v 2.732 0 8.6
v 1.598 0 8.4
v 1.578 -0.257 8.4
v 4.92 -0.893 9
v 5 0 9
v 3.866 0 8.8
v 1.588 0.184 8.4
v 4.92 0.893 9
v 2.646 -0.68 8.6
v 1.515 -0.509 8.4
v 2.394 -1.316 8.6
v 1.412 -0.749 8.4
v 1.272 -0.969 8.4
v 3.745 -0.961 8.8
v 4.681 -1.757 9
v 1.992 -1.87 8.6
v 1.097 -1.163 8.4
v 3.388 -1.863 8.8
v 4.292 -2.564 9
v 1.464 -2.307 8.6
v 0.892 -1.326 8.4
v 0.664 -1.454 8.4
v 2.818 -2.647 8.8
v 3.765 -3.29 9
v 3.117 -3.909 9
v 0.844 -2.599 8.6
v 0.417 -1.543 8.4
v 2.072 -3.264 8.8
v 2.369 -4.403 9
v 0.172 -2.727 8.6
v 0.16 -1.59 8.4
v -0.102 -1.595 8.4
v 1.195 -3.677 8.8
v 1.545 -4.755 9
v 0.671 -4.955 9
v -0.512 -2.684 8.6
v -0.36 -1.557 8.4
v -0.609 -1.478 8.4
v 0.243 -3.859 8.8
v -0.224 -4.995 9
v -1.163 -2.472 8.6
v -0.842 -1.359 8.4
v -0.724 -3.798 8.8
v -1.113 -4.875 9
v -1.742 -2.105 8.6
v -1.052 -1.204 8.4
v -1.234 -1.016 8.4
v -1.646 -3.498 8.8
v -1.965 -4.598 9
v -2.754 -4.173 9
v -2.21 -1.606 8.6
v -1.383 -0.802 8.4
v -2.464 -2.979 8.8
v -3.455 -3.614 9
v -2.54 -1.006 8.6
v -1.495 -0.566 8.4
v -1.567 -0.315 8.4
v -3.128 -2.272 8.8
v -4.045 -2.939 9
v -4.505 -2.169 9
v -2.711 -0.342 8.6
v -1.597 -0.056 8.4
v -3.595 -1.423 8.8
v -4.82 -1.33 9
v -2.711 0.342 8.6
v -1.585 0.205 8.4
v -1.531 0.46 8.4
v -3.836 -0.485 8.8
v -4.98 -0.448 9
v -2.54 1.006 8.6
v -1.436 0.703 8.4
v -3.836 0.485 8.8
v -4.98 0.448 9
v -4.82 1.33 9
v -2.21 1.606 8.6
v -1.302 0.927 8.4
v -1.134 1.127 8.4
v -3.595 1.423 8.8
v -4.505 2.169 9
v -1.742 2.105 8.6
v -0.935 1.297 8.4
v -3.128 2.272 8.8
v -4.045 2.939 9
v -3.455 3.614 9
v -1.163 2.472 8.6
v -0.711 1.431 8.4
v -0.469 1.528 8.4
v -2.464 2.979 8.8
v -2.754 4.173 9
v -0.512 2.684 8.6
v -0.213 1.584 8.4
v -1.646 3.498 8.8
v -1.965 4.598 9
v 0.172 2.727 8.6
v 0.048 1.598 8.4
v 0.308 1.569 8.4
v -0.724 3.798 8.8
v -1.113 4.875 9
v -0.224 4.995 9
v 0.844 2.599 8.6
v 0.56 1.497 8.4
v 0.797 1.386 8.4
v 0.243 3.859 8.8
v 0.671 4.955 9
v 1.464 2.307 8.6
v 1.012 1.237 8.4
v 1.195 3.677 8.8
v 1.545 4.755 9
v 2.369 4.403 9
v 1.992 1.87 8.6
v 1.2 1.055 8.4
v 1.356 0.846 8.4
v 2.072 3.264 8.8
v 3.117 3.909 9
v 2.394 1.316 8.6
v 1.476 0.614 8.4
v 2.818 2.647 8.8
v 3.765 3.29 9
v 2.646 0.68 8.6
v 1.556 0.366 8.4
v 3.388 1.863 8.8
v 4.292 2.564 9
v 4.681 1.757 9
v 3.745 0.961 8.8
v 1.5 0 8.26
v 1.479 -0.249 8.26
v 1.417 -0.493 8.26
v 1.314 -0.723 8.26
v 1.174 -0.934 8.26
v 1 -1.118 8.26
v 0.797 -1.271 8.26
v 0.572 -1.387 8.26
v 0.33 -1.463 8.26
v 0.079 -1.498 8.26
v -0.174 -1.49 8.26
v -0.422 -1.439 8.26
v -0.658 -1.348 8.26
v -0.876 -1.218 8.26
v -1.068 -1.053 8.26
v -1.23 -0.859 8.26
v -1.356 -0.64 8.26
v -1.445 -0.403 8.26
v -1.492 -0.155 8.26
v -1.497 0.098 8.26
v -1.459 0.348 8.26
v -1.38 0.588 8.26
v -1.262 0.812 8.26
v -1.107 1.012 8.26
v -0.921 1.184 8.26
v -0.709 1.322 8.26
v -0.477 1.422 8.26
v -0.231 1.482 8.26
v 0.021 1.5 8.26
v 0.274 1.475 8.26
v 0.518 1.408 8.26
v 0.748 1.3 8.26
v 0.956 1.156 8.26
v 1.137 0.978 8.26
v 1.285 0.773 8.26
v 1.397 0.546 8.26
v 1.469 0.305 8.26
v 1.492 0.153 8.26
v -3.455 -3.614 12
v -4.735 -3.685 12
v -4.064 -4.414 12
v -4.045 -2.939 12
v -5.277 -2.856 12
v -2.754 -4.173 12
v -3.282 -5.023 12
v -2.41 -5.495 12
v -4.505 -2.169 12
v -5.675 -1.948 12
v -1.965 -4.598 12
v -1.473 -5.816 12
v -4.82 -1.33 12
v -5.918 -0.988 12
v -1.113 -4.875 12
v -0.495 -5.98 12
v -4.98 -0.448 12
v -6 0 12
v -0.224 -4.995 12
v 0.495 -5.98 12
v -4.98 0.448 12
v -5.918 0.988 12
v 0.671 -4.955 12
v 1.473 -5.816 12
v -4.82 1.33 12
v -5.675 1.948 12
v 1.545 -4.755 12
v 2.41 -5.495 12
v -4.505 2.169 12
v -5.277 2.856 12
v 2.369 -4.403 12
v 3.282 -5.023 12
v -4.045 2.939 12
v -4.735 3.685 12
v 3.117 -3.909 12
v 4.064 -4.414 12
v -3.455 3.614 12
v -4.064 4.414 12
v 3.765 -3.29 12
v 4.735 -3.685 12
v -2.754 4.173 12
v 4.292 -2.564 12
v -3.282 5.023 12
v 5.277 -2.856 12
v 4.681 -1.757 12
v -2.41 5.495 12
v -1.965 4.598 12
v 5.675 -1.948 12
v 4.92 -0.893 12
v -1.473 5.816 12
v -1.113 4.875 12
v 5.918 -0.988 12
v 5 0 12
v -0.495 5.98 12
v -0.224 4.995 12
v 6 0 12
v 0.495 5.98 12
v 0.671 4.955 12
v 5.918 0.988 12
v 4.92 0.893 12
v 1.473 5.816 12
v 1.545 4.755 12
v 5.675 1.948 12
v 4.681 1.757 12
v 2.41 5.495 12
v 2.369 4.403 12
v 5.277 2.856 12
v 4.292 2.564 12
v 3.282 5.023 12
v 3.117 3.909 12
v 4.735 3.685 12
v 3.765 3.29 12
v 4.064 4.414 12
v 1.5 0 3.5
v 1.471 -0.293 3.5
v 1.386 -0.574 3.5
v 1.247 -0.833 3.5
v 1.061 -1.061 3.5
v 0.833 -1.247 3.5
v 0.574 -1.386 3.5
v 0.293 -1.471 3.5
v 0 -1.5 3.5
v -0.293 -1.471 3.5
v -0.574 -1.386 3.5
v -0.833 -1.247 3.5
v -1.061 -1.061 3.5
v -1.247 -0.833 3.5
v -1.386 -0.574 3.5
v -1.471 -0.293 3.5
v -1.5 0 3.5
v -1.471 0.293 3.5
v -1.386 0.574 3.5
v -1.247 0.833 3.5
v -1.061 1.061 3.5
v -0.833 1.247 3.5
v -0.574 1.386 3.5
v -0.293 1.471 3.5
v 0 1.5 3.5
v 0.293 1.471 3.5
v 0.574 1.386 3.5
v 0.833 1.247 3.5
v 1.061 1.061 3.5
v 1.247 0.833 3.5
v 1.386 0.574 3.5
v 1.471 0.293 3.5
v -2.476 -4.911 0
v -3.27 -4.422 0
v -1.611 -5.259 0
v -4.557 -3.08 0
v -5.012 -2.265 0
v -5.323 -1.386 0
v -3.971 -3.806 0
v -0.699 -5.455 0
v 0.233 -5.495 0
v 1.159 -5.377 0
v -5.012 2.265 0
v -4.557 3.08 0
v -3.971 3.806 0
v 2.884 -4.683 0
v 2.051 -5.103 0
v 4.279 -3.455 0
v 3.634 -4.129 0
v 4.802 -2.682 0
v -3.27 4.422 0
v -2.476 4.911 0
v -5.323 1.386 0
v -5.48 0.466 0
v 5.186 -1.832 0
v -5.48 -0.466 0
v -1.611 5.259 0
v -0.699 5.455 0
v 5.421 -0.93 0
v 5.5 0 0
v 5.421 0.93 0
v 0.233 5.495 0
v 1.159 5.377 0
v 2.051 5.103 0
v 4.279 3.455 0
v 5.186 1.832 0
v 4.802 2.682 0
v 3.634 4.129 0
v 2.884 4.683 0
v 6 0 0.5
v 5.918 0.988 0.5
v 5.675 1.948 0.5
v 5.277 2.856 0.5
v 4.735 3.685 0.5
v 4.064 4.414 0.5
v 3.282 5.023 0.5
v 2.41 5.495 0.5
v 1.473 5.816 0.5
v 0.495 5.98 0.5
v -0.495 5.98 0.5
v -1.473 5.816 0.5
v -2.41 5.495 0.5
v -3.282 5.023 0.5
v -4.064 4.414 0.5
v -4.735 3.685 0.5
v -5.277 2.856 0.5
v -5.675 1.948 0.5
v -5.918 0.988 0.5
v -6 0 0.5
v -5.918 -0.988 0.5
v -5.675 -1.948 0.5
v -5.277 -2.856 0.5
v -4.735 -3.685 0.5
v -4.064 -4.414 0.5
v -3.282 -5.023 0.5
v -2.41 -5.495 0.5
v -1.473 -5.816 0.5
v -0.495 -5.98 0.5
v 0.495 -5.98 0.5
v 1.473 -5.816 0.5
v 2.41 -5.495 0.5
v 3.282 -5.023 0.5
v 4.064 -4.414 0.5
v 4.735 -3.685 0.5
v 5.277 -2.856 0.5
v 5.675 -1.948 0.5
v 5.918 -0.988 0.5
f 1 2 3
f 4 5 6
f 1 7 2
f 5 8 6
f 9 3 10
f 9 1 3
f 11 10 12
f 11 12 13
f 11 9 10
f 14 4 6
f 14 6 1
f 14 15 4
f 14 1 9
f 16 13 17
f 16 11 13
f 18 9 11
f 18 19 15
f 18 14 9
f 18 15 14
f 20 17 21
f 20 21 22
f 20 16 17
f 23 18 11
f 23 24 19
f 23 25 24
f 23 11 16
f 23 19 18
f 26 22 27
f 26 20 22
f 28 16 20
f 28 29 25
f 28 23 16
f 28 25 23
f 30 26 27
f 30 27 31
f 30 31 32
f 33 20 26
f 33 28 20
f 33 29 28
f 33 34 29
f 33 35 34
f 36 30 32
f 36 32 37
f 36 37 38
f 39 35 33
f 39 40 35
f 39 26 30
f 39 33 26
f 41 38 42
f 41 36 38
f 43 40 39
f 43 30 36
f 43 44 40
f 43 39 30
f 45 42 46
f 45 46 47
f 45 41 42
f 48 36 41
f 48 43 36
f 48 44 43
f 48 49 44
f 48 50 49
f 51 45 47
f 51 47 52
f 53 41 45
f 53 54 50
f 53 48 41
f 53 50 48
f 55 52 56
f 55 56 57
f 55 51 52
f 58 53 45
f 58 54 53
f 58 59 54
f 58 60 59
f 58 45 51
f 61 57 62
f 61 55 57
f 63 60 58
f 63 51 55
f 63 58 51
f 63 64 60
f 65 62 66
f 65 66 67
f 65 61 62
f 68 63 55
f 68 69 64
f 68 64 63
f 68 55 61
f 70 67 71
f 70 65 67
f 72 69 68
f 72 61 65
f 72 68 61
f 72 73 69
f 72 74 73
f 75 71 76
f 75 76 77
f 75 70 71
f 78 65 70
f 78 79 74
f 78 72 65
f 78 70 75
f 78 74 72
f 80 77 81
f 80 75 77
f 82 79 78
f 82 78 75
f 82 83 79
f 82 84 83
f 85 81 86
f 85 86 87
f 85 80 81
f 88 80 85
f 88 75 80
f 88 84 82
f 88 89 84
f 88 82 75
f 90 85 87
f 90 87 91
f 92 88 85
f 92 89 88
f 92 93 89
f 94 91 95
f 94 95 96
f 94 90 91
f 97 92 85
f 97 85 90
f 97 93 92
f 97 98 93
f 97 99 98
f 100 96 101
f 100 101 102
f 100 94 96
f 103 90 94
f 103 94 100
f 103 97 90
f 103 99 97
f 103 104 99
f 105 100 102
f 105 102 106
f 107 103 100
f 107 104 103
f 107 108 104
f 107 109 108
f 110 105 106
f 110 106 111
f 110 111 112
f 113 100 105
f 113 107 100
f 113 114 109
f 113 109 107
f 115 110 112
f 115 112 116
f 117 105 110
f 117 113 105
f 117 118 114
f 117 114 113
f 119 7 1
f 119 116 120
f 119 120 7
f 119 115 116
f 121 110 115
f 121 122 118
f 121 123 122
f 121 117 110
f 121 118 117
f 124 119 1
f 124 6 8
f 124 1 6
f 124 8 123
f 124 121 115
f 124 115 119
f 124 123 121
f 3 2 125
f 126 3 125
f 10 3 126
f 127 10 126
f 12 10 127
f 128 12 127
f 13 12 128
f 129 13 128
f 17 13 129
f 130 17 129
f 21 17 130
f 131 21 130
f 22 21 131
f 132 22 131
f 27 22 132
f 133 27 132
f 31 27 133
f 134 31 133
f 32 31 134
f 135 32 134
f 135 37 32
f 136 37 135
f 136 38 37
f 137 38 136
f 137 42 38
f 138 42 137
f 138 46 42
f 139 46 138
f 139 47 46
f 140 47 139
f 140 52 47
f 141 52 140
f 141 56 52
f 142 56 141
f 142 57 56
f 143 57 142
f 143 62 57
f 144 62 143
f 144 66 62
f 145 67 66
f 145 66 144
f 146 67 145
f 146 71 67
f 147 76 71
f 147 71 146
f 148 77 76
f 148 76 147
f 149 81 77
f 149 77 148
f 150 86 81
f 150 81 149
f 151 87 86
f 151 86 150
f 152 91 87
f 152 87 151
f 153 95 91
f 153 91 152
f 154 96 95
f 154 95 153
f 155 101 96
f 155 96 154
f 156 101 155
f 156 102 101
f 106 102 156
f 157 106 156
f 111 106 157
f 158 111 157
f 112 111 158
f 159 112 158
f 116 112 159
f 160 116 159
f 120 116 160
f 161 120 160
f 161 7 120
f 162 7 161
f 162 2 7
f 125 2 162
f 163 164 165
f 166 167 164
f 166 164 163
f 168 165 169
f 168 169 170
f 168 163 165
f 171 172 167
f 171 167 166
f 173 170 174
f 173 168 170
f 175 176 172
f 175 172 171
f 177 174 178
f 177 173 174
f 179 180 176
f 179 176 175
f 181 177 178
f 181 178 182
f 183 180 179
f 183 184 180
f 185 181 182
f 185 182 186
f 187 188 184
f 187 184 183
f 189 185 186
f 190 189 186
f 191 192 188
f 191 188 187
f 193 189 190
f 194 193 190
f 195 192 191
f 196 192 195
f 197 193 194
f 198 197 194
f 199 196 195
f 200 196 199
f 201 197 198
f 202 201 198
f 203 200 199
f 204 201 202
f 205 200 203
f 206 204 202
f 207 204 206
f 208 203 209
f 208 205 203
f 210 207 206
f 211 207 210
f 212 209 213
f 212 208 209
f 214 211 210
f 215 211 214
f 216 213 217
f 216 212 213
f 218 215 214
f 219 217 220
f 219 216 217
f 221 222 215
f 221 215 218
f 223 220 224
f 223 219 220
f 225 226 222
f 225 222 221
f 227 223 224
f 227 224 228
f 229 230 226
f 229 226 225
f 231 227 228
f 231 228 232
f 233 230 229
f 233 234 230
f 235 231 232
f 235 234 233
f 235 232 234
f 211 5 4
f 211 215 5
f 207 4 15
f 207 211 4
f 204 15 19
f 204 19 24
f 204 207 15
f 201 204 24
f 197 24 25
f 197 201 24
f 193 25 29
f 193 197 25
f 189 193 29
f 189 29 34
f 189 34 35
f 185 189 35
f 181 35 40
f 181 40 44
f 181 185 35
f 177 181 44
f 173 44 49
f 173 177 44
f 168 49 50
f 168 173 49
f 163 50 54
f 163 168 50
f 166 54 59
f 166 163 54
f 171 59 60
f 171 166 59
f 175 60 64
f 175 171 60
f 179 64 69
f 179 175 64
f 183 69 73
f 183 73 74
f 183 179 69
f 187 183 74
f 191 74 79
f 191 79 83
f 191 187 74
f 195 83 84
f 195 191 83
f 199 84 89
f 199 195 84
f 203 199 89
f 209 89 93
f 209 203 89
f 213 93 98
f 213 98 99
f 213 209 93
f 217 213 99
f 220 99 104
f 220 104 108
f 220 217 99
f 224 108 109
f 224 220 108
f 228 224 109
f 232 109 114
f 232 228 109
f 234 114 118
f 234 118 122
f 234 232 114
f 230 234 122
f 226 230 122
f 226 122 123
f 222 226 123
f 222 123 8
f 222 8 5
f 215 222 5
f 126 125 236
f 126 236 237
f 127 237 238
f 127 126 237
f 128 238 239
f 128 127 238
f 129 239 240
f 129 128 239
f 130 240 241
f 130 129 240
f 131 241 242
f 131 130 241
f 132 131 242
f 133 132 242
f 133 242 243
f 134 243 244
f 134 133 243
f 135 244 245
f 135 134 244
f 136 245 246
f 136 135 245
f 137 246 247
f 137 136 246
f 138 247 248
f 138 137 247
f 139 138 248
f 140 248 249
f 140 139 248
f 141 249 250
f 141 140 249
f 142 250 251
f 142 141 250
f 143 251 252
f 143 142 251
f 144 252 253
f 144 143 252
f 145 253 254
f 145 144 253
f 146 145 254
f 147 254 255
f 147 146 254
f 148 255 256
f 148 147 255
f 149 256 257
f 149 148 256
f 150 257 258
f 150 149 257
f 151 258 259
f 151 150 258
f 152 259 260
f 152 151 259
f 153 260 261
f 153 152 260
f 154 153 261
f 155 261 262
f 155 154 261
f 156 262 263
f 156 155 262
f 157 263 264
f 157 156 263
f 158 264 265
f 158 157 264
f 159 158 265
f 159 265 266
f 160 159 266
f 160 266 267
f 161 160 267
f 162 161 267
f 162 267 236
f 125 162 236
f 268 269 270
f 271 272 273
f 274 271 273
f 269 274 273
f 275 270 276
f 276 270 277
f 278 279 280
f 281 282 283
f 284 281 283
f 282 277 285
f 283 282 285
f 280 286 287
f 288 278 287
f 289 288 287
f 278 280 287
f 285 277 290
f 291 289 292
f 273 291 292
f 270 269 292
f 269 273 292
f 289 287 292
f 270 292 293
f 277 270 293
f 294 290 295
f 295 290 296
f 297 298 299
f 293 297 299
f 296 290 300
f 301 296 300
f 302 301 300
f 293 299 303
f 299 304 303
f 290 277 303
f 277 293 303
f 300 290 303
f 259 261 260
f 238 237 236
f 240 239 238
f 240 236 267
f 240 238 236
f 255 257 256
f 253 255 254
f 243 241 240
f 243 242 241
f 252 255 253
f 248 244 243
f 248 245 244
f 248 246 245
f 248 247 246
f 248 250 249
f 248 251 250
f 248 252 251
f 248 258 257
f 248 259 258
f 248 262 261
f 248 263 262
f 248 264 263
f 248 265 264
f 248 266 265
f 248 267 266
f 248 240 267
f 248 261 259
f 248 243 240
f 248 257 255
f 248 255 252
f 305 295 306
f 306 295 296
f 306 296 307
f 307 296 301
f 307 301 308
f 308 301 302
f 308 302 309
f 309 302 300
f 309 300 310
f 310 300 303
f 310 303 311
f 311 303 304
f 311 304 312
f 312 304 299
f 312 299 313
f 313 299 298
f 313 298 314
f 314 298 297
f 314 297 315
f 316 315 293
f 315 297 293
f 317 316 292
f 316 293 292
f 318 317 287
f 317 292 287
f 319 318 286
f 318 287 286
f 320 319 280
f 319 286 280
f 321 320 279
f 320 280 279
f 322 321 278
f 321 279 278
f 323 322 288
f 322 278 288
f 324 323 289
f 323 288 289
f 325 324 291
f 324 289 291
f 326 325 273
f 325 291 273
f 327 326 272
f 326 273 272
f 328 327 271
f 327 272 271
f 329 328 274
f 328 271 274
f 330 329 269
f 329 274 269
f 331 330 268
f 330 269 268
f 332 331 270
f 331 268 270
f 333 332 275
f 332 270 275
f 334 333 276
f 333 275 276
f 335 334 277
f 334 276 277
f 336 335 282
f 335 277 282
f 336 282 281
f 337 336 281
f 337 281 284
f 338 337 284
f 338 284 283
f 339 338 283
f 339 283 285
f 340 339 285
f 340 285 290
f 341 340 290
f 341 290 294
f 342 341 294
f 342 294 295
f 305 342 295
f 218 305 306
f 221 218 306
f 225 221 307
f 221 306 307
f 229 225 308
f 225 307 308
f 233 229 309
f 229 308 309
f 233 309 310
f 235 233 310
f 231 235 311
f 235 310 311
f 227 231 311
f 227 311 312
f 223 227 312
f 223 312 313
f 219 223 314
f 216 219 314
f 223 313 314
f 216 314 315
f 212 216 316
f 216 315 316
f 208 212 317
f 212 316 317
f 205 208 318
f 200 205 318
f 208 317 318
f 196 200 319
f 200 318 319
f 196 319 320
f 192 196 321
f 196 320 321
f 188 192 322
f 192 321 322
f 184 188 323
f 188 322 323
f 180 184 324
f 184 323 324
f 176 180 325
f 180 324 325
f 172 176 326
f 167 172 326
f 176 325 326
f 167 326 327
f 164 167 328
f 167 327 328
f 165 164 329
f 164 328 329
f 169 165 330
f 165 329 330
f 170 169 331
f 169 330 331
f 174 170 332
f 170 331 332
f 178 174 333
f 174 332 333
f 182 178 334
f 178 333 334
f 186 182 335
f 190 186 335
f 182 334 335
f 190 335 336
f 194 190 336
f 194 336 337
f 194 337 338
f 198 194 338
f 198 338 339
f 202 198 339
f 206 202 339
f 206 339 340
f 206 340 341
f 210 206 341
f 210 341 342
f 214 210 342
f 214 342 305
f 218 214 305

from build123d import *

# Parameters (mm, degrees)
SKETCH2_R           = 6
BOSS_EXTRUDE1_DEPTH = 12
CHAMFER1_SIZE       = 0.1
CHAMFER1_SIZE2      = 0.123280305
CHAMFER2_SIZE       = 0.5


with BuildPart() as part:
    # Sketch2 → Boss-Extrude1 (new body)
    with BuildSketch(Plane.XY):
        Circle(SKETCH2_R)
    extrude(amount=BOSS_EXTRUDE1_DEPTH)

    # Sketch3 → Cut-Revolve1 (revolve, cut)
    with BuildSketch(Plane(origin=(0, 0, 0), x_dir=(1, 0, 0), z_dir=(0, 1, 0))):
        Polygon((0, -12), (0, -3.5), (1.5, -3.5), (1.5, -8.382855568), (5, -9), (5, -12), align=None)
    revolve(axis=Axis((0, 0, 12), (0, 0, -1)), mode=Mode.SUBTRACT)

    # Chamfer1
    chamfer1_edges = [part.edges().sort_by_distance(p)[0] for p in [
        (-1.5, 0, 8.382855568),
    ]]
    chamfer1_side = [part.faces().sort_by_distance(p)[0] for p in [
        (-3.25, 0, 8.691427784),
    ]]
    chamfer(chamfer1_edges, length=CHAMFER1_SIZE, length2=CHAMFER1_SIZE2, reference=chamfer1_side[0])

    # Chamfer2
    chamfer2_edges = [part.edges().sort_by_distance(p)[0] for p in [
        (-6, 0, 0),
    ]]
    chamfer(chamfer2_edges, length=CHAMFER2_SIZE)


solid = part.part
